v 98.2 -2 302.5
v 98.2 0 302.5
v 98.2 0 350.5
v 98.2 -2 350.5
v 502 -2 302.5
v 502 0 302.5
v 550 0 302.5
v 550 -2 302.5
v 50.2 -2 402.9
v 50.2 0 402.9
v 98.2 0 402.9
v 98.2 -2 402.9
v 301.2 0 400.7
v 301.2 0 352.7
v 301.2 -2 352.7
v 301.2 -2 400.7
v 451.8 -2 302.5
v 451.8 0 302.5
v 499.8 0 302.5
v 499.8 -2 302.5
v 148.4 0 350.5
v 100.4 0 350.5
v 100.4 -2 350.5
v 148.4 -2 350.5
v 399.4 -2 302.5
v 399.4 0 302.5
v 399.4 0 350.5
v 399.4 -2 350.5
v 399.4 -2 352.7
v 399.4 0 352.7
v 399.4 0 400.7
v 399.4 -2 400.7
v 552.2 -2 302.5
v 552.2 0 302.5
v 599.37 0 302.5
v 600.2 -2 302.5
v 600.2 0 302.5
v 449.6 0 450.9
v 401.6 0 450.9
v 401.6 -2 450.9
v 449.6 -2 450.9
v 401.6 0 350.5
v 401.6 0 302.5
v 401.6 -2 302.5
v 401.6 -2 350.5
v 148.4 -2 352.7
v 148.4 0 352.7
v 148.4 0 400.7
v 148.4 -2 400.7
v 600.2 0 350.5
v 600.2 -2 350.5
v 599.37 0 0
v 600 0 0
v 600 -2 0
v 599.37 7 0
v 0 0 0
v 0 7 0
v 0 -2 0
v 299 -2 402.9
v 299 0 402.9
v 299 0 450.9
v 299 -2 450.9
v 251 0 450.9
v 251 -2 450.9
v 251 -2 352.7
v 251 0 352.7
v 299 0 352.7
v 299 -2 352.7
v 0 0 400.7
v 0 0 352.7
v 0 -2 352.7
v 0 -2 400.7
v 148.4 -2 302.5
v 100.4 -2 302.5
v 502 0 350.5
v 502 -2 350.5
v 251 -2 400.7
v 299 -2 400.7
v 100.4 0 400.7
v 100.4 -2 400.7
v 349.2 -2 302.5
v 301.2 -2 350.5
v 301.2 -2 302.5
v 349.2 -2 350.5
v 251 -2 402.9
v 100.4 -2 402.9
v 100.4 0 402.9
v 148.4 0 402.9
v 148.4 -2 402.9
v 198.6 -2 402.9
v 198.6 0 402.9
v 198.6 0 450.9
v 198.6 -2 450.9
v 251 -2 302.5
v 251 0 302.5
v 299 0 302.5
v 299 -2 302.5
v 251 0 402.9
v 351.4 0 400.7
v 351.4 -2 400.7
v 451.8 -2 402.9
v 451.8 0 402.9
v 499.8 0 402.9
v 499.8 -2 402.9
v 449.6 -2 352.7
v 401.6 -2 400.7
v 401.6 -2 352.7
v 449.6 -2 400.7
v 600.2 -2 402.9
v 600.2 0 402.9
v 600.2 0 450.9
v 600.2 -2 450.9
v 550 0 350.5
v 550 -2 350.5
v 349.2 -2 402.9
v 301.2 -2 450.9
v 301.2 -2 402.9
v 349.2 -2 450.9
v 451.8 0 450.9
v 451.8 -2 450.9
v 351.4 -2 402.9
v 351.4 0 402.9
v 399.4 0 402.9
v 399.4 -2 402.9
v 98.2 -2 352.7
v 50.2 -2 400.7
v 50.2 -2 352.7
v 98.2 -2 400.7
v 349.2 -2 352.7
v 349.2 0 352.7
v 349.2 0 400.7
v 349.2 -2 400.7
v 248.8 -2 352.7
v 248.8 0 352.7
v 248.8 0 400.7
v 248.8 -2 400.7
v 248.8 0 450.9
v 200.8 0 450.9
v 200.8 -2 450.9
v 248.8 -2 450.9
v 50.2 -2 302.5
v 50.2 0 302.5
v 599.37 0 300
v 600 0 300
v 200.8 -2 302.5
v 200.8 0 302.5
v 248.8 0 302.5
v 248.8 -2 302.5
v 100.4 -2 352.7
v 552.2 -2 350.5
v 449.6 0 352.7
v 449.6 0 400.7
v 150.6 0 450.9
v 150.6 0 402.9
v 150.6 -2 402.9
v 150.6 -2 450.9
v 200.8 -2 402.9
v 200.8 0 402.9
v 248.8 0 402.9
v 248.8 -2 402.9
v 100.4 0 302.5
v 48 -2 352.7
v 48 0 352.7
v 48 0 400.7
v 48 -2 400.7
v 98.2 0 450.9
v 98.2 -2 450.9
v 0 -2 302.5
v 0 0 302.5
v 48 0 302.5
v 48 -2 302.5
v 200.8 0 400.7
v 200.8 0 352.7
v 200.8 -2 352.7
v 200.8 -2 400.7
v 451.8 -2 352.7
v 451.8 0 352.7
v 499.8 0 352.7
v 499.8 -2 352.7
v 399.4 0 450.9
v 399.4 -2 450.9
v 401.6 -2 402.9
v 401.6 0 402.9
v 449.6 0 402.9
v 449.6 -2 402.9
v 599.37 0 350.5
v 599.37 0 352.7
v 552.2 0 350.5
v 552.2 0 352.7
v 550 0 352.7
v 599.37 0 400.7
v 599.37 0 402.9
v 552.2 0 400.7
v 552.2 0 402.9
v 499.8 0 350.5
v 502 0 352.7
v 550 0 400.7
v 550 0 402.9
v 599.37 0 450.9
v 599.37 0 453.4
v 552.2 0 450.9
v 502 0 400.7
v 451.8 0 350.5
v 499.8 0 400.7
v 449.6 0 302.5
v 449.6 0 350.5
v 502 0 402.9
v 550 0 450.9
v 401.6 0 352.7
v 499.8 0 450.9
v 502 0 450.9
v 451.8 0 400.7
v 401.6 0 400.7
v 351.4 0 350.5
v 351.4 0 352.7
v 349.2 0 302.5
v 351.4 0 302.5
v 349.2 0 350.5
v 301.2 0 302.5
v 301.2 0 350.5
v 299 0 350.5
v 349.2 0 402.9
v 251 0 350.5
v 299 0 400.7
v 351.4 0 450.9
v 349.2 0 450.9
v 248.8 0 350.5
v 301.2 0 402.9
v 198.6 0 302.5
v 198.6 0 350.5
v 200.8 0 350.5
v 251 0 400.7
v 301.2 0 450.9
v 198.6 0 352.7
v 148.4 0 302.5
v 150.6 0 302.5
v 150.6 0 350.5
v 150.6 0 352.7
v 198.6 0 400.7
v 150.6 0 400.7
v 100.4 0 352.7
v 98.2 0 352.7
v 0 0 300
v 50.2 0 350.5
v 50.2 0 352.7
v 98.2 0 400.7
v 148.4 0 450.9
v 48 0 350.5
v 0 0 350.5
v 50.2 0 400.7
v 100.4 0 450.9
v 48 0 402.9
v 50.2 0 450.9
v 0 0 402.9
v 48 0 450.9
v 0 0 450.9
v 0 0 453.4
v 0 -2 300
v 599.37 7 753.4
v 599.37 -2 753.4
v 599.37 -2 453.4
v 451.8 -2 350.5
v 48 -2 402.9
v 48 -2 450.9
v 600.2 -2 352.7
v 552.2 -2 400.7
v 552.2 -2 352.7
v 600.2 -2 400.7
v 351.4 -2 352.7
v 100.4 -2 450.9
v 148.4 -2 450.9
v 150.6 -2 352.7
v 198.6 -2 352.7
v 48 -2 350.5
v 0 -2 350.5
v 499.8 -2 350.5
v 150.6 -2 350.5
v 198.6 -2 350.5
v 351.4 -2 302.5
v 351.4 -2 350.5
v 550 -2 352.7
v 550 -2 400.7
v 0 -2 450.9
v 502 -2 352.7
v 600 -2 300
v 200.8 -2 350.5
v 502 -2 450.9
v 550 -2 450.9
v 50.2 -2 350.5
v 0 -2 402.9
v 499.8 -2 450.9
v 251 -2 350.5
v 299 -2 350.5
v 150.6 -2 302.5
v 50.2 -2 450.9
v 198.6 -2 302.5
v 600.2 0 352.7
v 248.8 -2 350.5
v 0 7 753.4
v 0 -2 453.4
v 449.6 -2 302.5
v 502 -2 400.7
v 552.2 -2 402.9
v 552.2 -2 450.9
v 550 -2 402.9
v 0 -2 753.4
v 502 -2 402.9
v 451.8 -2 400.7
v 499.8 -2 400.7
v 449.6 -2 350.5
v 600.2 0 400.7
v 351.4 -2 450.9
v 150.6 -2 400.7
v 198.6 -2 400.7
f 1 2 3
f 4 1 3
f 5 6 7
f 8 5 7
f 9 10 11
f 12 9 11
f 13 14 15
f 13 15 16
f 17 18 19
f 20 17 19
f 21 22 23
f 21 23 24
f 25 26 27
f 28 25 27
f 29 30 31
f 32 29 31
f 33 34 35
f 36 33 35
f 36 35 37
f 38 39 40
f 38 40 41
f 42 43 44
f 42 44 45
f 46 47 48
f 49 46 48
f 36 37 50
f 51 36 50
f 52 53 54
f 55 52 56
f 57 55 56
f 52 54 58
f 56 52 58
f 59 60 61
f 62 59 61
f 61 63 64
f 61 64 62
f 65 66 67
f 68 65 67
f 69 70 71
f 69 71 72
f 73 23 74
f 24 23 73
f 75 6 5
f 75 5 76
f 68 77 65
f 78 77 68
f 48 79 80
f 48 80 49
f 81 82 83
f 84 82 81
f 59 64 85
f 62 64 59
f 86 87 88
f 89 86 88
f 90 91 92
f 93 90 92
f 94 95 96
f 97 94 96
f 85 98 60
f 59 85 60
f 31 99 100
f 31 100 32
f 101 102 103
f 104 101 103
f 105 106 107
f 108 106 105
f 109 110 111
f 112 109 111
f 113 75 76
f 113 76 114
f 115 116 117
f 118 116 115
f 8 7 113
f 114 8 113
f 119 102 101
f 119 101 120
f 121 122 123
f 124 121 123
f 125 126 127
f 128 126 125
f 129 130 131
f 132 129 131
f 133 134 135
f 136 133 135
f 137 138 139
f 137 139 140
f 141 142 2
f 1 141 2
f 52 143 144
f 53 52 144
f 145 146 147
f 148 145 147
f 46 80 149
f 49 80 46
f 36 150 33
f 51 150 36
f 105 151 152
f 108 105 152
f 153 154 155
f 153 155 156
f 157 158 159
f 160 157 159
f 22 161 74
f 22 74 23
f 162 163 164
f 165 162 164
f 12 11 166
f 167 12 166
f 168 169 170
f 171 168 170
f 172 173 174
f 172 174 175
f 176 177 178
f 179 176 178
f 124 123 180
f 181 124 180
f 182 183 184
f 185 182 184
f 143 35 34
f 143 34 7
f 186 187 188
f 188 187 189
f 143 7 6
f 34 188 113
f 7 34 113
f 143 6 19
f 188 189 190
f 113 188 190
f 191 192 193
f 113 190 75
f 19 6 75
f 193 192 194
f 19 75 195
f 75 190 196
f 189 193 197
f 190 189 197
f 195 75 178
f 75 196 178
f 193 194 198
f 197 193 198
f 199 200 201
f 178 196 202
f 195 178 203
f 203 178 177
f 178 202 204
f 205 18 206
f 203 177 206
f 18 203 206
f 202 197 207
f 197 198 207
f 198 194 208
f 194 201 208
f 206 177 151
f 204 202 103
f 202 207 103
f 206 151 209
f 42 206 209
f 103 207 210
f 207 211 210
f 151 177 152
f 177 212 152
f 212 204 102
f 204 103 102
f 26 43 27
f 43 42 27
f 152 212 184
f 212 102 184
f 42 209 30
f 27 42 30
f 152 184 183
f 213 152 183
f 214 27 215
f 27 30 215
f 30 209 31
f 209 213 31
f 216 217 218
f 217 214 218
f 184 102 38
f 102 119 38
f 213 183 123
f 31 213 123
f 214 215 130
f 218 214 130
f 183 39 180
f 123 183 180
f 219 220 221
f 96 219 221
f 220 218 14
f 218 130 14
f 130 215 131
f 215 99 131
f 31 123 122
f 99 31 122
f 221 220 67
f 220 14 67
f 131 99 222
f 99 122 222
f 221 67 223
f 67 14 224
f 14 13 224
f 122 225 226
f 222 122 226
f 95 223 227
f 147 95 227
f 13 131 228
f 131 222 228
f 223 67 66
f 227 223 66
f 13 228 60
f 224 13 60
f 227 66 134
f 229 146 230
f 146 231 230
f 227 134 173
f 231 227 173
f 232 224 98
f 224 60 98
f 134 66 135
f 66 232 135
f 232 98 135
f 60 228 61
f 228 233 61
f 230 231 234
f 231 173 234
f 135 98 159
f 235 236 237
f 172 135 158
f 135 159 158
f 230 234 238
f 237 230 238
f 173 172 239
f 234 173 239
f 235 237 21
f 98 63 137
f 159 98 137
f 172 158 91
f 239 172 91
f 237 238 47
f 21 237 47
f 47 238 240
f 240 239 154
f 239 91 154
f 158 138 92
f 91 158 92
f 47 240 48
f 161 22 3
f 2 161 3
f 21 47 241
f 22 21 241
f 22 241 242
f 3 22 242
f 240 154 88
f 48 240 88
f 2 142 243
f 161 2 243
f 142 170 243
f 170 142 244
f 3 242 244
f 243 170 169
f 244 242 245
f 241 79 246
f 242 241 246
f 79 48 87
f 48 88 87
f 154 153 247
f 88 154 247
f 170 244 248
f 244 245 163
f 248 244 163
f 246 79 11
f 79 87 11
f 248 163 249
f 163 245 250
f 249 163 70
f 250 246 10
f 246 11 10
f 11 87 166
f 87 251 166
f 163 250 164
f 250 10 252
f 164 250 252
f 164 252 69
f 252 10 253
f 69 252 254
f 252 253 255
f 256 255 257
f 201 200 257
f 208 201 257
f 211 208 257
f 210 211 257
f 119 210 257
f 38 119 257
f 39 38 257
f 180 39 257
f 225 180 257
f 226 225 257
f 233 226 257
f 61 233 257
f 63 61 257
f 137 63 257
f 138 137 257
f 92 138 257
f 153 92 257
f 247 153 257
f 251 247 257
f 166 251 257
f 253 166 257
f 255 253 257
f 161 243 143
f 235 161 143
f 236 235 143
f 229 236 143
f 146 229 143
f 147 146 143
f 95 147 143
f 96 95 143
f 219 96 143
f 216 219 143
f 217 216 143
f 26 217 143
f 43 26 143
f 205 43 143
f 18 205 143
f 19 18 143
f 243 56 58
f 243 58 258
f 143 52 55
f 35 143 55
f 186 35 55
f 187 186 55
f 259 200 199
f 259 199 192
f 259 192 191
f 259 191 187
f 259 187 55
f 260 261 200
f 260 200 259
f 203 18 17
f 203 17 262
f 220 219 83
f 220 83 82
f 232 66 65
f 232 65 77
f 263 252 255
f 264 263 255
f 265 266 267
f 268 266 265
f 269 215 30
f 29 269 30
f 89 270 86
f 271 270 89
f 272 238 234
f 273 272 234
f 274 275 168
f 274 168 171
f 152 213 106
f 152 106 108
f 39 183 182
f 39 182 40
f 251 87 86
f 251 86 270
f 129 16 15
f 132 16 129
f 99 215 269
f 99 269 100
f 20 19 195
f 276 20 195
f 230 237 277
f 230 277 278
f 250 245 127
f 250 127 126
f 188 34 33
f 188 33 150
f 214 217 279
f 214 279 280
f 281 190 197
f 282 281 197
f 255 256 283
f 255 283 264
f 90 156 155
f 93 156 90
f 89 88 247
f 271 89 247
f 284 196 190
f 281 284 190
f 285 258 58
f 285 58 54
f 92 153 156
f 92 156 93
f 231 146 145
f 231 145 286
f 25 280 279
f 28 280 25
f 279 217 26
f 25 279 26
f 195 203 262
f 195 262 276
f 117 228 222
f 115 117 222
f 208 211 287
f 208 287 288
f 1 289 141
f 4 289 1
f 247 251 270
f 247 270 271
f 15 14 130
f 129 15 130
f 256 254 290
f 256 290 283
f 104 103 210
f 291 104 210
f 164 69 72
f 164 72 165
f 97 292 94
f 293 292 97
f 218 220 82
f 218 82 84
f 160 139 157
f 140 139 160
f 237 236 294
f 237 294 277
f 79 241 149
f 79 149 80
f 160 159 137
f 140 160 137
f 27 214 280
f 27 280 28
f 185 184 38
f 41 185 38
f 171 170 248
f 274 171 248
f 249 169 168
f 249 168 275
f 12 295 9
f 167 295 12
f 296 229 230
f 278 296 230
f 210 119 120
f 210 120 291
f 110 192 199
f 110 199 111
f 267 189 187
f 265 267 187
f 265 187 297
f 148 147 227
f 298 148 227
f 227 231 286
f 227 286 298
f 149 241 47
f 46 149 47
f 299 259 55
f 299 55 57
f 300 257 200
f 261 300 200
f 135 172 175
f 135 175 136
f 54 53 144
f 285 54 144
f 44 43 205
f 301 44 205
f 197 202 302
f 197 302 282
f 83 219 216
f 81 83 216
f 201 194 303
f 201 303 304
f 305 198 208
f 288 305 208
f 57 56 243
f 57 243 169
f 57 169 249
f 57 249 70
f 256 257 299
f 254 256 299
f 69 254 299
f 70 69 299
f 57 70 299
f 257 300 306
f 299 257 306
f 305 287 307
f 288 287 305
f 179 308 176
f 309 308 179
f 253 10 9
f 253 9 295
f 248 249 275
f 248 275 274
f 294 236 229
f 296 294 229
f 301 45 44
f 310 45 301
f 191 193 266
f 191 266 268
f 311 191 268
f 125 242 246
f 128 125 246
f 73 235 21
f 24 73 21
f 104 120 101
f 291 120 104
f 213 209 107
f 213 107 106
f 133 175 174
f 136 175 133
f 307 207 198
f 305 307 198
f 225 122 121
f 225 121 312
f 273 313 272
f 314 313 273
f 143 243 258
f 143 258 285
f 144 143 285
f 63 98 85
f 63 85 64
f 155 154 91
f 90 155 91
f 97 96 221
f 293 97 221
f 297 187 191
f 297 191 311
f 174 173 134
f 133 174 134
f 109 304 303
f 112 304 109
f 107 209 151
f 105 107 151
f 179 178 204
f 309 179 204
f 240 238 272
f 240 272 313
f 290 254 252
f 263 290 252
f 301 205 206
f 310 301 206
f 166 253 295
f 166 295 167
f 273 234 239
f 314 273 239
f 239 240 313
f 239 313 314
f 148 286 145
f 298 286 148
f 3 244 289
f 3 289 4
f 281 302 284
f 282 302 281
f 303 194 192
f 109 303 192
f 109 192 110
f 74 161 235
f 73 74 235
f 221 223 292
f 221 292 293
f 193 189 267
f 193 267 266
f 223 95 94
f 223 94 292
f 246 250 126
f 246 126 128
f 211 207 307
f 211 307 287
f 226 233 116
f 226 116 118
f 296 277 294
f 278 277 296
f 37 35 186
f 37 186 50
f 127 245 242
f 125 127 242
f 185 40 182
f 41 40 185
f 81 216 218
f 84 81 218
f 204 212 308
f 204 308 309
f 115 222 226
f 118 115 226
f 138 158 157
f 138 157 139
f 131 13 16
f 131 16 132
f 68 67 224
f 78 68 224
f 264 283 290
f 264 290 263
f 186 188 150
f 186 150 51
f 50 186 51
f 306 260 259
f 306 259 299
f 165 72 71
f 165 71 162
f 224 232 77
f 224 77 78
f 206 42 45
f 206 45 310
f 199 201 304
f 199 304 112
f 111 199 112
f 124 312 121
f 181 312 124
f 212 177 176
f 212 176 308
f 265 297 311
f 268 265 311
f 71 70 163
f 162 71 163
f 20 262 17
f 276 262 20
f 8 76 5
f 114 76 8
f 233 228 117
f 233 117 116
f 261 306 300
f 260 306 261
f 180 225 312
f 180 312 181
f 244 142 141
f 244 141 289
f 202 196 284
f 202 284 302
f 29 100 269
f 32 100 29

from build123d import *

# Parameters (mm, degrees)
F0_W     = 600
F0_H     = 300
F0_W_2   = 48
F0_H_2   = 48
F0_W_3   = 599.369857
F1_DEPTH = 2
F2_W     = 599.369857
F2_H     = 753.4
F3_DEPTH = 7


with BuildPart() as f1:
    # F0 (on Front) → F1 (new body)
    with BuildSketch(Plane.XZ):
        with Locations((300, 150)):
            Rectangle(F0_W, F0_H)
        with Locations((24, 326.5)):
            Rectangle(F0_W_2, F0_H_2)
        with Locations((299.684929, 603.4)):
            Rectangle(F0_W_3, F0_H)
        with Locations((24, 376.7)):
            Rectangle(F0_W_2, F0_H_2)
        with Locations((24, 426.9)):
            Rectangle(F0_W_2, F0_H_2)
        with Locations((74.2, 326.5)):
            Rectangle(F0_W_2, F0_H_2)
        with Locations((74.2, 376.7)):
            Rectangle(F0_W_2, F0_H_2)
        with Locations((74.2, 426.9)):
            Rectangle(F0_W_2, F0_H_2)
        with Locations((124.4, 326.5)):
            Rectangle(F0_W_2, F0_H_2)
        with Locations((124.4, 376.7)):
            Rectangle(F0_W_2, F0_H_2)
        with Locations((124.4, 426.9)):
            Rectangle(F0_W_2, F0_H_2)
        with Locations((174.6, 326.5)):
            Rectangle(F0_W_2, F0_H_2)
        with Locations((174.6, 376.7)):
            Rectangle(F0_W_2, F0_H_2)
        with Locations((174.6, 426.9)):
            Rectangle(F0_W_2, F0_H_2)
        with Locations((224.8, 326.5)):
            Rectangle(F0_W_2, F0_H_2)
        with Locations((224.8, 376.7)):
            Rectangle(F0_W_2, F0_H_2)
        with Locations((224.8, 426.9)):
            Rectangle(F0_W_2, F0_H_2)
        with Locations((275, 326.5)):
            Rectangle(F0_W_2, F0_H_2)
        with Locations((275, 376.7)):
            Rectangle(F0_W_2, F0_H_2)
        with Locations((275, 426.9)):
            Rectangle(F0_W_2, F0_H_2)
        with Locations((325.2, 326.5)):
            Rectangle(F0_W_2, F0_H_2)
        with Locations((325.2, 376.7)):
            Rectangle(F0_W_2, F0_H_2)
        with Locations((325.2, 426.9)):
            Rectangle(F0_W_2, F0_H_2)
        with Locations((375.4, 326.5)):
            Rectangle(F0_W_2, F0_H_2)
        with Locations((375.4, 376.7)):
            Rectangle(F0_W_2, F0_H_2)
        with Locations((375.4, 426.9)):
            Rectangle(F0_W_2, F0_H_2)
        with Locations((425.6, 326.5)):
            Rectangle(F0_W_2, F0_H_2)
        with Locations((425.6, 376.7)):
            Rectangle(F0_W_2, F0_H_2)
        with Locations((425.6, 426.9)):
            Rectangle(F0_W_2, F0_H_2)
        with Locations((475.8, 326.5)):
            Rectangle(F0_W_2, F0_H_2)
        with Locations((475.8, 376.7)):
            Rectangle(F0_W_2, F0_H_2)
        with Locations((475.8, 426.9)):
            Rectangle(F0_W_2, F0_H_2)
        with Locations((526, 326.5)):
            Rectangle(F0_W_2, F0_H_2)
        with Locations((526, 376.7)):
            Rectangle(F0_W_2, F0_H_2)
        with Locations((526, 426.9)):
            Rectangle(F0_W_2, F0_H_2)
        with Locations((576.2, 326.5)):
            Rectangle(F0_W_2, F0_H_2)
        with Locations((576.2, 376.7)):
            Rectangle(F0_W_2, F0_H_2)
        with Locations((576.2, 426.9)):
            Rectangle(F0_W_2, F0_H_2)
    extrude(amount=F1_DEPTH)

    # F2 (on face) → F3 (join)
    with BuildSketch(Plane(origin=(0, 0, 0), x_dir=(-1, 0, 0), z_dir=(0, 1, 0))):
        with Locations((-299.684929, 376.7)):
            Rectangle(F2_W, F2_H)
    extrude(amount=F3_DEPTH)


solid = f1.part
